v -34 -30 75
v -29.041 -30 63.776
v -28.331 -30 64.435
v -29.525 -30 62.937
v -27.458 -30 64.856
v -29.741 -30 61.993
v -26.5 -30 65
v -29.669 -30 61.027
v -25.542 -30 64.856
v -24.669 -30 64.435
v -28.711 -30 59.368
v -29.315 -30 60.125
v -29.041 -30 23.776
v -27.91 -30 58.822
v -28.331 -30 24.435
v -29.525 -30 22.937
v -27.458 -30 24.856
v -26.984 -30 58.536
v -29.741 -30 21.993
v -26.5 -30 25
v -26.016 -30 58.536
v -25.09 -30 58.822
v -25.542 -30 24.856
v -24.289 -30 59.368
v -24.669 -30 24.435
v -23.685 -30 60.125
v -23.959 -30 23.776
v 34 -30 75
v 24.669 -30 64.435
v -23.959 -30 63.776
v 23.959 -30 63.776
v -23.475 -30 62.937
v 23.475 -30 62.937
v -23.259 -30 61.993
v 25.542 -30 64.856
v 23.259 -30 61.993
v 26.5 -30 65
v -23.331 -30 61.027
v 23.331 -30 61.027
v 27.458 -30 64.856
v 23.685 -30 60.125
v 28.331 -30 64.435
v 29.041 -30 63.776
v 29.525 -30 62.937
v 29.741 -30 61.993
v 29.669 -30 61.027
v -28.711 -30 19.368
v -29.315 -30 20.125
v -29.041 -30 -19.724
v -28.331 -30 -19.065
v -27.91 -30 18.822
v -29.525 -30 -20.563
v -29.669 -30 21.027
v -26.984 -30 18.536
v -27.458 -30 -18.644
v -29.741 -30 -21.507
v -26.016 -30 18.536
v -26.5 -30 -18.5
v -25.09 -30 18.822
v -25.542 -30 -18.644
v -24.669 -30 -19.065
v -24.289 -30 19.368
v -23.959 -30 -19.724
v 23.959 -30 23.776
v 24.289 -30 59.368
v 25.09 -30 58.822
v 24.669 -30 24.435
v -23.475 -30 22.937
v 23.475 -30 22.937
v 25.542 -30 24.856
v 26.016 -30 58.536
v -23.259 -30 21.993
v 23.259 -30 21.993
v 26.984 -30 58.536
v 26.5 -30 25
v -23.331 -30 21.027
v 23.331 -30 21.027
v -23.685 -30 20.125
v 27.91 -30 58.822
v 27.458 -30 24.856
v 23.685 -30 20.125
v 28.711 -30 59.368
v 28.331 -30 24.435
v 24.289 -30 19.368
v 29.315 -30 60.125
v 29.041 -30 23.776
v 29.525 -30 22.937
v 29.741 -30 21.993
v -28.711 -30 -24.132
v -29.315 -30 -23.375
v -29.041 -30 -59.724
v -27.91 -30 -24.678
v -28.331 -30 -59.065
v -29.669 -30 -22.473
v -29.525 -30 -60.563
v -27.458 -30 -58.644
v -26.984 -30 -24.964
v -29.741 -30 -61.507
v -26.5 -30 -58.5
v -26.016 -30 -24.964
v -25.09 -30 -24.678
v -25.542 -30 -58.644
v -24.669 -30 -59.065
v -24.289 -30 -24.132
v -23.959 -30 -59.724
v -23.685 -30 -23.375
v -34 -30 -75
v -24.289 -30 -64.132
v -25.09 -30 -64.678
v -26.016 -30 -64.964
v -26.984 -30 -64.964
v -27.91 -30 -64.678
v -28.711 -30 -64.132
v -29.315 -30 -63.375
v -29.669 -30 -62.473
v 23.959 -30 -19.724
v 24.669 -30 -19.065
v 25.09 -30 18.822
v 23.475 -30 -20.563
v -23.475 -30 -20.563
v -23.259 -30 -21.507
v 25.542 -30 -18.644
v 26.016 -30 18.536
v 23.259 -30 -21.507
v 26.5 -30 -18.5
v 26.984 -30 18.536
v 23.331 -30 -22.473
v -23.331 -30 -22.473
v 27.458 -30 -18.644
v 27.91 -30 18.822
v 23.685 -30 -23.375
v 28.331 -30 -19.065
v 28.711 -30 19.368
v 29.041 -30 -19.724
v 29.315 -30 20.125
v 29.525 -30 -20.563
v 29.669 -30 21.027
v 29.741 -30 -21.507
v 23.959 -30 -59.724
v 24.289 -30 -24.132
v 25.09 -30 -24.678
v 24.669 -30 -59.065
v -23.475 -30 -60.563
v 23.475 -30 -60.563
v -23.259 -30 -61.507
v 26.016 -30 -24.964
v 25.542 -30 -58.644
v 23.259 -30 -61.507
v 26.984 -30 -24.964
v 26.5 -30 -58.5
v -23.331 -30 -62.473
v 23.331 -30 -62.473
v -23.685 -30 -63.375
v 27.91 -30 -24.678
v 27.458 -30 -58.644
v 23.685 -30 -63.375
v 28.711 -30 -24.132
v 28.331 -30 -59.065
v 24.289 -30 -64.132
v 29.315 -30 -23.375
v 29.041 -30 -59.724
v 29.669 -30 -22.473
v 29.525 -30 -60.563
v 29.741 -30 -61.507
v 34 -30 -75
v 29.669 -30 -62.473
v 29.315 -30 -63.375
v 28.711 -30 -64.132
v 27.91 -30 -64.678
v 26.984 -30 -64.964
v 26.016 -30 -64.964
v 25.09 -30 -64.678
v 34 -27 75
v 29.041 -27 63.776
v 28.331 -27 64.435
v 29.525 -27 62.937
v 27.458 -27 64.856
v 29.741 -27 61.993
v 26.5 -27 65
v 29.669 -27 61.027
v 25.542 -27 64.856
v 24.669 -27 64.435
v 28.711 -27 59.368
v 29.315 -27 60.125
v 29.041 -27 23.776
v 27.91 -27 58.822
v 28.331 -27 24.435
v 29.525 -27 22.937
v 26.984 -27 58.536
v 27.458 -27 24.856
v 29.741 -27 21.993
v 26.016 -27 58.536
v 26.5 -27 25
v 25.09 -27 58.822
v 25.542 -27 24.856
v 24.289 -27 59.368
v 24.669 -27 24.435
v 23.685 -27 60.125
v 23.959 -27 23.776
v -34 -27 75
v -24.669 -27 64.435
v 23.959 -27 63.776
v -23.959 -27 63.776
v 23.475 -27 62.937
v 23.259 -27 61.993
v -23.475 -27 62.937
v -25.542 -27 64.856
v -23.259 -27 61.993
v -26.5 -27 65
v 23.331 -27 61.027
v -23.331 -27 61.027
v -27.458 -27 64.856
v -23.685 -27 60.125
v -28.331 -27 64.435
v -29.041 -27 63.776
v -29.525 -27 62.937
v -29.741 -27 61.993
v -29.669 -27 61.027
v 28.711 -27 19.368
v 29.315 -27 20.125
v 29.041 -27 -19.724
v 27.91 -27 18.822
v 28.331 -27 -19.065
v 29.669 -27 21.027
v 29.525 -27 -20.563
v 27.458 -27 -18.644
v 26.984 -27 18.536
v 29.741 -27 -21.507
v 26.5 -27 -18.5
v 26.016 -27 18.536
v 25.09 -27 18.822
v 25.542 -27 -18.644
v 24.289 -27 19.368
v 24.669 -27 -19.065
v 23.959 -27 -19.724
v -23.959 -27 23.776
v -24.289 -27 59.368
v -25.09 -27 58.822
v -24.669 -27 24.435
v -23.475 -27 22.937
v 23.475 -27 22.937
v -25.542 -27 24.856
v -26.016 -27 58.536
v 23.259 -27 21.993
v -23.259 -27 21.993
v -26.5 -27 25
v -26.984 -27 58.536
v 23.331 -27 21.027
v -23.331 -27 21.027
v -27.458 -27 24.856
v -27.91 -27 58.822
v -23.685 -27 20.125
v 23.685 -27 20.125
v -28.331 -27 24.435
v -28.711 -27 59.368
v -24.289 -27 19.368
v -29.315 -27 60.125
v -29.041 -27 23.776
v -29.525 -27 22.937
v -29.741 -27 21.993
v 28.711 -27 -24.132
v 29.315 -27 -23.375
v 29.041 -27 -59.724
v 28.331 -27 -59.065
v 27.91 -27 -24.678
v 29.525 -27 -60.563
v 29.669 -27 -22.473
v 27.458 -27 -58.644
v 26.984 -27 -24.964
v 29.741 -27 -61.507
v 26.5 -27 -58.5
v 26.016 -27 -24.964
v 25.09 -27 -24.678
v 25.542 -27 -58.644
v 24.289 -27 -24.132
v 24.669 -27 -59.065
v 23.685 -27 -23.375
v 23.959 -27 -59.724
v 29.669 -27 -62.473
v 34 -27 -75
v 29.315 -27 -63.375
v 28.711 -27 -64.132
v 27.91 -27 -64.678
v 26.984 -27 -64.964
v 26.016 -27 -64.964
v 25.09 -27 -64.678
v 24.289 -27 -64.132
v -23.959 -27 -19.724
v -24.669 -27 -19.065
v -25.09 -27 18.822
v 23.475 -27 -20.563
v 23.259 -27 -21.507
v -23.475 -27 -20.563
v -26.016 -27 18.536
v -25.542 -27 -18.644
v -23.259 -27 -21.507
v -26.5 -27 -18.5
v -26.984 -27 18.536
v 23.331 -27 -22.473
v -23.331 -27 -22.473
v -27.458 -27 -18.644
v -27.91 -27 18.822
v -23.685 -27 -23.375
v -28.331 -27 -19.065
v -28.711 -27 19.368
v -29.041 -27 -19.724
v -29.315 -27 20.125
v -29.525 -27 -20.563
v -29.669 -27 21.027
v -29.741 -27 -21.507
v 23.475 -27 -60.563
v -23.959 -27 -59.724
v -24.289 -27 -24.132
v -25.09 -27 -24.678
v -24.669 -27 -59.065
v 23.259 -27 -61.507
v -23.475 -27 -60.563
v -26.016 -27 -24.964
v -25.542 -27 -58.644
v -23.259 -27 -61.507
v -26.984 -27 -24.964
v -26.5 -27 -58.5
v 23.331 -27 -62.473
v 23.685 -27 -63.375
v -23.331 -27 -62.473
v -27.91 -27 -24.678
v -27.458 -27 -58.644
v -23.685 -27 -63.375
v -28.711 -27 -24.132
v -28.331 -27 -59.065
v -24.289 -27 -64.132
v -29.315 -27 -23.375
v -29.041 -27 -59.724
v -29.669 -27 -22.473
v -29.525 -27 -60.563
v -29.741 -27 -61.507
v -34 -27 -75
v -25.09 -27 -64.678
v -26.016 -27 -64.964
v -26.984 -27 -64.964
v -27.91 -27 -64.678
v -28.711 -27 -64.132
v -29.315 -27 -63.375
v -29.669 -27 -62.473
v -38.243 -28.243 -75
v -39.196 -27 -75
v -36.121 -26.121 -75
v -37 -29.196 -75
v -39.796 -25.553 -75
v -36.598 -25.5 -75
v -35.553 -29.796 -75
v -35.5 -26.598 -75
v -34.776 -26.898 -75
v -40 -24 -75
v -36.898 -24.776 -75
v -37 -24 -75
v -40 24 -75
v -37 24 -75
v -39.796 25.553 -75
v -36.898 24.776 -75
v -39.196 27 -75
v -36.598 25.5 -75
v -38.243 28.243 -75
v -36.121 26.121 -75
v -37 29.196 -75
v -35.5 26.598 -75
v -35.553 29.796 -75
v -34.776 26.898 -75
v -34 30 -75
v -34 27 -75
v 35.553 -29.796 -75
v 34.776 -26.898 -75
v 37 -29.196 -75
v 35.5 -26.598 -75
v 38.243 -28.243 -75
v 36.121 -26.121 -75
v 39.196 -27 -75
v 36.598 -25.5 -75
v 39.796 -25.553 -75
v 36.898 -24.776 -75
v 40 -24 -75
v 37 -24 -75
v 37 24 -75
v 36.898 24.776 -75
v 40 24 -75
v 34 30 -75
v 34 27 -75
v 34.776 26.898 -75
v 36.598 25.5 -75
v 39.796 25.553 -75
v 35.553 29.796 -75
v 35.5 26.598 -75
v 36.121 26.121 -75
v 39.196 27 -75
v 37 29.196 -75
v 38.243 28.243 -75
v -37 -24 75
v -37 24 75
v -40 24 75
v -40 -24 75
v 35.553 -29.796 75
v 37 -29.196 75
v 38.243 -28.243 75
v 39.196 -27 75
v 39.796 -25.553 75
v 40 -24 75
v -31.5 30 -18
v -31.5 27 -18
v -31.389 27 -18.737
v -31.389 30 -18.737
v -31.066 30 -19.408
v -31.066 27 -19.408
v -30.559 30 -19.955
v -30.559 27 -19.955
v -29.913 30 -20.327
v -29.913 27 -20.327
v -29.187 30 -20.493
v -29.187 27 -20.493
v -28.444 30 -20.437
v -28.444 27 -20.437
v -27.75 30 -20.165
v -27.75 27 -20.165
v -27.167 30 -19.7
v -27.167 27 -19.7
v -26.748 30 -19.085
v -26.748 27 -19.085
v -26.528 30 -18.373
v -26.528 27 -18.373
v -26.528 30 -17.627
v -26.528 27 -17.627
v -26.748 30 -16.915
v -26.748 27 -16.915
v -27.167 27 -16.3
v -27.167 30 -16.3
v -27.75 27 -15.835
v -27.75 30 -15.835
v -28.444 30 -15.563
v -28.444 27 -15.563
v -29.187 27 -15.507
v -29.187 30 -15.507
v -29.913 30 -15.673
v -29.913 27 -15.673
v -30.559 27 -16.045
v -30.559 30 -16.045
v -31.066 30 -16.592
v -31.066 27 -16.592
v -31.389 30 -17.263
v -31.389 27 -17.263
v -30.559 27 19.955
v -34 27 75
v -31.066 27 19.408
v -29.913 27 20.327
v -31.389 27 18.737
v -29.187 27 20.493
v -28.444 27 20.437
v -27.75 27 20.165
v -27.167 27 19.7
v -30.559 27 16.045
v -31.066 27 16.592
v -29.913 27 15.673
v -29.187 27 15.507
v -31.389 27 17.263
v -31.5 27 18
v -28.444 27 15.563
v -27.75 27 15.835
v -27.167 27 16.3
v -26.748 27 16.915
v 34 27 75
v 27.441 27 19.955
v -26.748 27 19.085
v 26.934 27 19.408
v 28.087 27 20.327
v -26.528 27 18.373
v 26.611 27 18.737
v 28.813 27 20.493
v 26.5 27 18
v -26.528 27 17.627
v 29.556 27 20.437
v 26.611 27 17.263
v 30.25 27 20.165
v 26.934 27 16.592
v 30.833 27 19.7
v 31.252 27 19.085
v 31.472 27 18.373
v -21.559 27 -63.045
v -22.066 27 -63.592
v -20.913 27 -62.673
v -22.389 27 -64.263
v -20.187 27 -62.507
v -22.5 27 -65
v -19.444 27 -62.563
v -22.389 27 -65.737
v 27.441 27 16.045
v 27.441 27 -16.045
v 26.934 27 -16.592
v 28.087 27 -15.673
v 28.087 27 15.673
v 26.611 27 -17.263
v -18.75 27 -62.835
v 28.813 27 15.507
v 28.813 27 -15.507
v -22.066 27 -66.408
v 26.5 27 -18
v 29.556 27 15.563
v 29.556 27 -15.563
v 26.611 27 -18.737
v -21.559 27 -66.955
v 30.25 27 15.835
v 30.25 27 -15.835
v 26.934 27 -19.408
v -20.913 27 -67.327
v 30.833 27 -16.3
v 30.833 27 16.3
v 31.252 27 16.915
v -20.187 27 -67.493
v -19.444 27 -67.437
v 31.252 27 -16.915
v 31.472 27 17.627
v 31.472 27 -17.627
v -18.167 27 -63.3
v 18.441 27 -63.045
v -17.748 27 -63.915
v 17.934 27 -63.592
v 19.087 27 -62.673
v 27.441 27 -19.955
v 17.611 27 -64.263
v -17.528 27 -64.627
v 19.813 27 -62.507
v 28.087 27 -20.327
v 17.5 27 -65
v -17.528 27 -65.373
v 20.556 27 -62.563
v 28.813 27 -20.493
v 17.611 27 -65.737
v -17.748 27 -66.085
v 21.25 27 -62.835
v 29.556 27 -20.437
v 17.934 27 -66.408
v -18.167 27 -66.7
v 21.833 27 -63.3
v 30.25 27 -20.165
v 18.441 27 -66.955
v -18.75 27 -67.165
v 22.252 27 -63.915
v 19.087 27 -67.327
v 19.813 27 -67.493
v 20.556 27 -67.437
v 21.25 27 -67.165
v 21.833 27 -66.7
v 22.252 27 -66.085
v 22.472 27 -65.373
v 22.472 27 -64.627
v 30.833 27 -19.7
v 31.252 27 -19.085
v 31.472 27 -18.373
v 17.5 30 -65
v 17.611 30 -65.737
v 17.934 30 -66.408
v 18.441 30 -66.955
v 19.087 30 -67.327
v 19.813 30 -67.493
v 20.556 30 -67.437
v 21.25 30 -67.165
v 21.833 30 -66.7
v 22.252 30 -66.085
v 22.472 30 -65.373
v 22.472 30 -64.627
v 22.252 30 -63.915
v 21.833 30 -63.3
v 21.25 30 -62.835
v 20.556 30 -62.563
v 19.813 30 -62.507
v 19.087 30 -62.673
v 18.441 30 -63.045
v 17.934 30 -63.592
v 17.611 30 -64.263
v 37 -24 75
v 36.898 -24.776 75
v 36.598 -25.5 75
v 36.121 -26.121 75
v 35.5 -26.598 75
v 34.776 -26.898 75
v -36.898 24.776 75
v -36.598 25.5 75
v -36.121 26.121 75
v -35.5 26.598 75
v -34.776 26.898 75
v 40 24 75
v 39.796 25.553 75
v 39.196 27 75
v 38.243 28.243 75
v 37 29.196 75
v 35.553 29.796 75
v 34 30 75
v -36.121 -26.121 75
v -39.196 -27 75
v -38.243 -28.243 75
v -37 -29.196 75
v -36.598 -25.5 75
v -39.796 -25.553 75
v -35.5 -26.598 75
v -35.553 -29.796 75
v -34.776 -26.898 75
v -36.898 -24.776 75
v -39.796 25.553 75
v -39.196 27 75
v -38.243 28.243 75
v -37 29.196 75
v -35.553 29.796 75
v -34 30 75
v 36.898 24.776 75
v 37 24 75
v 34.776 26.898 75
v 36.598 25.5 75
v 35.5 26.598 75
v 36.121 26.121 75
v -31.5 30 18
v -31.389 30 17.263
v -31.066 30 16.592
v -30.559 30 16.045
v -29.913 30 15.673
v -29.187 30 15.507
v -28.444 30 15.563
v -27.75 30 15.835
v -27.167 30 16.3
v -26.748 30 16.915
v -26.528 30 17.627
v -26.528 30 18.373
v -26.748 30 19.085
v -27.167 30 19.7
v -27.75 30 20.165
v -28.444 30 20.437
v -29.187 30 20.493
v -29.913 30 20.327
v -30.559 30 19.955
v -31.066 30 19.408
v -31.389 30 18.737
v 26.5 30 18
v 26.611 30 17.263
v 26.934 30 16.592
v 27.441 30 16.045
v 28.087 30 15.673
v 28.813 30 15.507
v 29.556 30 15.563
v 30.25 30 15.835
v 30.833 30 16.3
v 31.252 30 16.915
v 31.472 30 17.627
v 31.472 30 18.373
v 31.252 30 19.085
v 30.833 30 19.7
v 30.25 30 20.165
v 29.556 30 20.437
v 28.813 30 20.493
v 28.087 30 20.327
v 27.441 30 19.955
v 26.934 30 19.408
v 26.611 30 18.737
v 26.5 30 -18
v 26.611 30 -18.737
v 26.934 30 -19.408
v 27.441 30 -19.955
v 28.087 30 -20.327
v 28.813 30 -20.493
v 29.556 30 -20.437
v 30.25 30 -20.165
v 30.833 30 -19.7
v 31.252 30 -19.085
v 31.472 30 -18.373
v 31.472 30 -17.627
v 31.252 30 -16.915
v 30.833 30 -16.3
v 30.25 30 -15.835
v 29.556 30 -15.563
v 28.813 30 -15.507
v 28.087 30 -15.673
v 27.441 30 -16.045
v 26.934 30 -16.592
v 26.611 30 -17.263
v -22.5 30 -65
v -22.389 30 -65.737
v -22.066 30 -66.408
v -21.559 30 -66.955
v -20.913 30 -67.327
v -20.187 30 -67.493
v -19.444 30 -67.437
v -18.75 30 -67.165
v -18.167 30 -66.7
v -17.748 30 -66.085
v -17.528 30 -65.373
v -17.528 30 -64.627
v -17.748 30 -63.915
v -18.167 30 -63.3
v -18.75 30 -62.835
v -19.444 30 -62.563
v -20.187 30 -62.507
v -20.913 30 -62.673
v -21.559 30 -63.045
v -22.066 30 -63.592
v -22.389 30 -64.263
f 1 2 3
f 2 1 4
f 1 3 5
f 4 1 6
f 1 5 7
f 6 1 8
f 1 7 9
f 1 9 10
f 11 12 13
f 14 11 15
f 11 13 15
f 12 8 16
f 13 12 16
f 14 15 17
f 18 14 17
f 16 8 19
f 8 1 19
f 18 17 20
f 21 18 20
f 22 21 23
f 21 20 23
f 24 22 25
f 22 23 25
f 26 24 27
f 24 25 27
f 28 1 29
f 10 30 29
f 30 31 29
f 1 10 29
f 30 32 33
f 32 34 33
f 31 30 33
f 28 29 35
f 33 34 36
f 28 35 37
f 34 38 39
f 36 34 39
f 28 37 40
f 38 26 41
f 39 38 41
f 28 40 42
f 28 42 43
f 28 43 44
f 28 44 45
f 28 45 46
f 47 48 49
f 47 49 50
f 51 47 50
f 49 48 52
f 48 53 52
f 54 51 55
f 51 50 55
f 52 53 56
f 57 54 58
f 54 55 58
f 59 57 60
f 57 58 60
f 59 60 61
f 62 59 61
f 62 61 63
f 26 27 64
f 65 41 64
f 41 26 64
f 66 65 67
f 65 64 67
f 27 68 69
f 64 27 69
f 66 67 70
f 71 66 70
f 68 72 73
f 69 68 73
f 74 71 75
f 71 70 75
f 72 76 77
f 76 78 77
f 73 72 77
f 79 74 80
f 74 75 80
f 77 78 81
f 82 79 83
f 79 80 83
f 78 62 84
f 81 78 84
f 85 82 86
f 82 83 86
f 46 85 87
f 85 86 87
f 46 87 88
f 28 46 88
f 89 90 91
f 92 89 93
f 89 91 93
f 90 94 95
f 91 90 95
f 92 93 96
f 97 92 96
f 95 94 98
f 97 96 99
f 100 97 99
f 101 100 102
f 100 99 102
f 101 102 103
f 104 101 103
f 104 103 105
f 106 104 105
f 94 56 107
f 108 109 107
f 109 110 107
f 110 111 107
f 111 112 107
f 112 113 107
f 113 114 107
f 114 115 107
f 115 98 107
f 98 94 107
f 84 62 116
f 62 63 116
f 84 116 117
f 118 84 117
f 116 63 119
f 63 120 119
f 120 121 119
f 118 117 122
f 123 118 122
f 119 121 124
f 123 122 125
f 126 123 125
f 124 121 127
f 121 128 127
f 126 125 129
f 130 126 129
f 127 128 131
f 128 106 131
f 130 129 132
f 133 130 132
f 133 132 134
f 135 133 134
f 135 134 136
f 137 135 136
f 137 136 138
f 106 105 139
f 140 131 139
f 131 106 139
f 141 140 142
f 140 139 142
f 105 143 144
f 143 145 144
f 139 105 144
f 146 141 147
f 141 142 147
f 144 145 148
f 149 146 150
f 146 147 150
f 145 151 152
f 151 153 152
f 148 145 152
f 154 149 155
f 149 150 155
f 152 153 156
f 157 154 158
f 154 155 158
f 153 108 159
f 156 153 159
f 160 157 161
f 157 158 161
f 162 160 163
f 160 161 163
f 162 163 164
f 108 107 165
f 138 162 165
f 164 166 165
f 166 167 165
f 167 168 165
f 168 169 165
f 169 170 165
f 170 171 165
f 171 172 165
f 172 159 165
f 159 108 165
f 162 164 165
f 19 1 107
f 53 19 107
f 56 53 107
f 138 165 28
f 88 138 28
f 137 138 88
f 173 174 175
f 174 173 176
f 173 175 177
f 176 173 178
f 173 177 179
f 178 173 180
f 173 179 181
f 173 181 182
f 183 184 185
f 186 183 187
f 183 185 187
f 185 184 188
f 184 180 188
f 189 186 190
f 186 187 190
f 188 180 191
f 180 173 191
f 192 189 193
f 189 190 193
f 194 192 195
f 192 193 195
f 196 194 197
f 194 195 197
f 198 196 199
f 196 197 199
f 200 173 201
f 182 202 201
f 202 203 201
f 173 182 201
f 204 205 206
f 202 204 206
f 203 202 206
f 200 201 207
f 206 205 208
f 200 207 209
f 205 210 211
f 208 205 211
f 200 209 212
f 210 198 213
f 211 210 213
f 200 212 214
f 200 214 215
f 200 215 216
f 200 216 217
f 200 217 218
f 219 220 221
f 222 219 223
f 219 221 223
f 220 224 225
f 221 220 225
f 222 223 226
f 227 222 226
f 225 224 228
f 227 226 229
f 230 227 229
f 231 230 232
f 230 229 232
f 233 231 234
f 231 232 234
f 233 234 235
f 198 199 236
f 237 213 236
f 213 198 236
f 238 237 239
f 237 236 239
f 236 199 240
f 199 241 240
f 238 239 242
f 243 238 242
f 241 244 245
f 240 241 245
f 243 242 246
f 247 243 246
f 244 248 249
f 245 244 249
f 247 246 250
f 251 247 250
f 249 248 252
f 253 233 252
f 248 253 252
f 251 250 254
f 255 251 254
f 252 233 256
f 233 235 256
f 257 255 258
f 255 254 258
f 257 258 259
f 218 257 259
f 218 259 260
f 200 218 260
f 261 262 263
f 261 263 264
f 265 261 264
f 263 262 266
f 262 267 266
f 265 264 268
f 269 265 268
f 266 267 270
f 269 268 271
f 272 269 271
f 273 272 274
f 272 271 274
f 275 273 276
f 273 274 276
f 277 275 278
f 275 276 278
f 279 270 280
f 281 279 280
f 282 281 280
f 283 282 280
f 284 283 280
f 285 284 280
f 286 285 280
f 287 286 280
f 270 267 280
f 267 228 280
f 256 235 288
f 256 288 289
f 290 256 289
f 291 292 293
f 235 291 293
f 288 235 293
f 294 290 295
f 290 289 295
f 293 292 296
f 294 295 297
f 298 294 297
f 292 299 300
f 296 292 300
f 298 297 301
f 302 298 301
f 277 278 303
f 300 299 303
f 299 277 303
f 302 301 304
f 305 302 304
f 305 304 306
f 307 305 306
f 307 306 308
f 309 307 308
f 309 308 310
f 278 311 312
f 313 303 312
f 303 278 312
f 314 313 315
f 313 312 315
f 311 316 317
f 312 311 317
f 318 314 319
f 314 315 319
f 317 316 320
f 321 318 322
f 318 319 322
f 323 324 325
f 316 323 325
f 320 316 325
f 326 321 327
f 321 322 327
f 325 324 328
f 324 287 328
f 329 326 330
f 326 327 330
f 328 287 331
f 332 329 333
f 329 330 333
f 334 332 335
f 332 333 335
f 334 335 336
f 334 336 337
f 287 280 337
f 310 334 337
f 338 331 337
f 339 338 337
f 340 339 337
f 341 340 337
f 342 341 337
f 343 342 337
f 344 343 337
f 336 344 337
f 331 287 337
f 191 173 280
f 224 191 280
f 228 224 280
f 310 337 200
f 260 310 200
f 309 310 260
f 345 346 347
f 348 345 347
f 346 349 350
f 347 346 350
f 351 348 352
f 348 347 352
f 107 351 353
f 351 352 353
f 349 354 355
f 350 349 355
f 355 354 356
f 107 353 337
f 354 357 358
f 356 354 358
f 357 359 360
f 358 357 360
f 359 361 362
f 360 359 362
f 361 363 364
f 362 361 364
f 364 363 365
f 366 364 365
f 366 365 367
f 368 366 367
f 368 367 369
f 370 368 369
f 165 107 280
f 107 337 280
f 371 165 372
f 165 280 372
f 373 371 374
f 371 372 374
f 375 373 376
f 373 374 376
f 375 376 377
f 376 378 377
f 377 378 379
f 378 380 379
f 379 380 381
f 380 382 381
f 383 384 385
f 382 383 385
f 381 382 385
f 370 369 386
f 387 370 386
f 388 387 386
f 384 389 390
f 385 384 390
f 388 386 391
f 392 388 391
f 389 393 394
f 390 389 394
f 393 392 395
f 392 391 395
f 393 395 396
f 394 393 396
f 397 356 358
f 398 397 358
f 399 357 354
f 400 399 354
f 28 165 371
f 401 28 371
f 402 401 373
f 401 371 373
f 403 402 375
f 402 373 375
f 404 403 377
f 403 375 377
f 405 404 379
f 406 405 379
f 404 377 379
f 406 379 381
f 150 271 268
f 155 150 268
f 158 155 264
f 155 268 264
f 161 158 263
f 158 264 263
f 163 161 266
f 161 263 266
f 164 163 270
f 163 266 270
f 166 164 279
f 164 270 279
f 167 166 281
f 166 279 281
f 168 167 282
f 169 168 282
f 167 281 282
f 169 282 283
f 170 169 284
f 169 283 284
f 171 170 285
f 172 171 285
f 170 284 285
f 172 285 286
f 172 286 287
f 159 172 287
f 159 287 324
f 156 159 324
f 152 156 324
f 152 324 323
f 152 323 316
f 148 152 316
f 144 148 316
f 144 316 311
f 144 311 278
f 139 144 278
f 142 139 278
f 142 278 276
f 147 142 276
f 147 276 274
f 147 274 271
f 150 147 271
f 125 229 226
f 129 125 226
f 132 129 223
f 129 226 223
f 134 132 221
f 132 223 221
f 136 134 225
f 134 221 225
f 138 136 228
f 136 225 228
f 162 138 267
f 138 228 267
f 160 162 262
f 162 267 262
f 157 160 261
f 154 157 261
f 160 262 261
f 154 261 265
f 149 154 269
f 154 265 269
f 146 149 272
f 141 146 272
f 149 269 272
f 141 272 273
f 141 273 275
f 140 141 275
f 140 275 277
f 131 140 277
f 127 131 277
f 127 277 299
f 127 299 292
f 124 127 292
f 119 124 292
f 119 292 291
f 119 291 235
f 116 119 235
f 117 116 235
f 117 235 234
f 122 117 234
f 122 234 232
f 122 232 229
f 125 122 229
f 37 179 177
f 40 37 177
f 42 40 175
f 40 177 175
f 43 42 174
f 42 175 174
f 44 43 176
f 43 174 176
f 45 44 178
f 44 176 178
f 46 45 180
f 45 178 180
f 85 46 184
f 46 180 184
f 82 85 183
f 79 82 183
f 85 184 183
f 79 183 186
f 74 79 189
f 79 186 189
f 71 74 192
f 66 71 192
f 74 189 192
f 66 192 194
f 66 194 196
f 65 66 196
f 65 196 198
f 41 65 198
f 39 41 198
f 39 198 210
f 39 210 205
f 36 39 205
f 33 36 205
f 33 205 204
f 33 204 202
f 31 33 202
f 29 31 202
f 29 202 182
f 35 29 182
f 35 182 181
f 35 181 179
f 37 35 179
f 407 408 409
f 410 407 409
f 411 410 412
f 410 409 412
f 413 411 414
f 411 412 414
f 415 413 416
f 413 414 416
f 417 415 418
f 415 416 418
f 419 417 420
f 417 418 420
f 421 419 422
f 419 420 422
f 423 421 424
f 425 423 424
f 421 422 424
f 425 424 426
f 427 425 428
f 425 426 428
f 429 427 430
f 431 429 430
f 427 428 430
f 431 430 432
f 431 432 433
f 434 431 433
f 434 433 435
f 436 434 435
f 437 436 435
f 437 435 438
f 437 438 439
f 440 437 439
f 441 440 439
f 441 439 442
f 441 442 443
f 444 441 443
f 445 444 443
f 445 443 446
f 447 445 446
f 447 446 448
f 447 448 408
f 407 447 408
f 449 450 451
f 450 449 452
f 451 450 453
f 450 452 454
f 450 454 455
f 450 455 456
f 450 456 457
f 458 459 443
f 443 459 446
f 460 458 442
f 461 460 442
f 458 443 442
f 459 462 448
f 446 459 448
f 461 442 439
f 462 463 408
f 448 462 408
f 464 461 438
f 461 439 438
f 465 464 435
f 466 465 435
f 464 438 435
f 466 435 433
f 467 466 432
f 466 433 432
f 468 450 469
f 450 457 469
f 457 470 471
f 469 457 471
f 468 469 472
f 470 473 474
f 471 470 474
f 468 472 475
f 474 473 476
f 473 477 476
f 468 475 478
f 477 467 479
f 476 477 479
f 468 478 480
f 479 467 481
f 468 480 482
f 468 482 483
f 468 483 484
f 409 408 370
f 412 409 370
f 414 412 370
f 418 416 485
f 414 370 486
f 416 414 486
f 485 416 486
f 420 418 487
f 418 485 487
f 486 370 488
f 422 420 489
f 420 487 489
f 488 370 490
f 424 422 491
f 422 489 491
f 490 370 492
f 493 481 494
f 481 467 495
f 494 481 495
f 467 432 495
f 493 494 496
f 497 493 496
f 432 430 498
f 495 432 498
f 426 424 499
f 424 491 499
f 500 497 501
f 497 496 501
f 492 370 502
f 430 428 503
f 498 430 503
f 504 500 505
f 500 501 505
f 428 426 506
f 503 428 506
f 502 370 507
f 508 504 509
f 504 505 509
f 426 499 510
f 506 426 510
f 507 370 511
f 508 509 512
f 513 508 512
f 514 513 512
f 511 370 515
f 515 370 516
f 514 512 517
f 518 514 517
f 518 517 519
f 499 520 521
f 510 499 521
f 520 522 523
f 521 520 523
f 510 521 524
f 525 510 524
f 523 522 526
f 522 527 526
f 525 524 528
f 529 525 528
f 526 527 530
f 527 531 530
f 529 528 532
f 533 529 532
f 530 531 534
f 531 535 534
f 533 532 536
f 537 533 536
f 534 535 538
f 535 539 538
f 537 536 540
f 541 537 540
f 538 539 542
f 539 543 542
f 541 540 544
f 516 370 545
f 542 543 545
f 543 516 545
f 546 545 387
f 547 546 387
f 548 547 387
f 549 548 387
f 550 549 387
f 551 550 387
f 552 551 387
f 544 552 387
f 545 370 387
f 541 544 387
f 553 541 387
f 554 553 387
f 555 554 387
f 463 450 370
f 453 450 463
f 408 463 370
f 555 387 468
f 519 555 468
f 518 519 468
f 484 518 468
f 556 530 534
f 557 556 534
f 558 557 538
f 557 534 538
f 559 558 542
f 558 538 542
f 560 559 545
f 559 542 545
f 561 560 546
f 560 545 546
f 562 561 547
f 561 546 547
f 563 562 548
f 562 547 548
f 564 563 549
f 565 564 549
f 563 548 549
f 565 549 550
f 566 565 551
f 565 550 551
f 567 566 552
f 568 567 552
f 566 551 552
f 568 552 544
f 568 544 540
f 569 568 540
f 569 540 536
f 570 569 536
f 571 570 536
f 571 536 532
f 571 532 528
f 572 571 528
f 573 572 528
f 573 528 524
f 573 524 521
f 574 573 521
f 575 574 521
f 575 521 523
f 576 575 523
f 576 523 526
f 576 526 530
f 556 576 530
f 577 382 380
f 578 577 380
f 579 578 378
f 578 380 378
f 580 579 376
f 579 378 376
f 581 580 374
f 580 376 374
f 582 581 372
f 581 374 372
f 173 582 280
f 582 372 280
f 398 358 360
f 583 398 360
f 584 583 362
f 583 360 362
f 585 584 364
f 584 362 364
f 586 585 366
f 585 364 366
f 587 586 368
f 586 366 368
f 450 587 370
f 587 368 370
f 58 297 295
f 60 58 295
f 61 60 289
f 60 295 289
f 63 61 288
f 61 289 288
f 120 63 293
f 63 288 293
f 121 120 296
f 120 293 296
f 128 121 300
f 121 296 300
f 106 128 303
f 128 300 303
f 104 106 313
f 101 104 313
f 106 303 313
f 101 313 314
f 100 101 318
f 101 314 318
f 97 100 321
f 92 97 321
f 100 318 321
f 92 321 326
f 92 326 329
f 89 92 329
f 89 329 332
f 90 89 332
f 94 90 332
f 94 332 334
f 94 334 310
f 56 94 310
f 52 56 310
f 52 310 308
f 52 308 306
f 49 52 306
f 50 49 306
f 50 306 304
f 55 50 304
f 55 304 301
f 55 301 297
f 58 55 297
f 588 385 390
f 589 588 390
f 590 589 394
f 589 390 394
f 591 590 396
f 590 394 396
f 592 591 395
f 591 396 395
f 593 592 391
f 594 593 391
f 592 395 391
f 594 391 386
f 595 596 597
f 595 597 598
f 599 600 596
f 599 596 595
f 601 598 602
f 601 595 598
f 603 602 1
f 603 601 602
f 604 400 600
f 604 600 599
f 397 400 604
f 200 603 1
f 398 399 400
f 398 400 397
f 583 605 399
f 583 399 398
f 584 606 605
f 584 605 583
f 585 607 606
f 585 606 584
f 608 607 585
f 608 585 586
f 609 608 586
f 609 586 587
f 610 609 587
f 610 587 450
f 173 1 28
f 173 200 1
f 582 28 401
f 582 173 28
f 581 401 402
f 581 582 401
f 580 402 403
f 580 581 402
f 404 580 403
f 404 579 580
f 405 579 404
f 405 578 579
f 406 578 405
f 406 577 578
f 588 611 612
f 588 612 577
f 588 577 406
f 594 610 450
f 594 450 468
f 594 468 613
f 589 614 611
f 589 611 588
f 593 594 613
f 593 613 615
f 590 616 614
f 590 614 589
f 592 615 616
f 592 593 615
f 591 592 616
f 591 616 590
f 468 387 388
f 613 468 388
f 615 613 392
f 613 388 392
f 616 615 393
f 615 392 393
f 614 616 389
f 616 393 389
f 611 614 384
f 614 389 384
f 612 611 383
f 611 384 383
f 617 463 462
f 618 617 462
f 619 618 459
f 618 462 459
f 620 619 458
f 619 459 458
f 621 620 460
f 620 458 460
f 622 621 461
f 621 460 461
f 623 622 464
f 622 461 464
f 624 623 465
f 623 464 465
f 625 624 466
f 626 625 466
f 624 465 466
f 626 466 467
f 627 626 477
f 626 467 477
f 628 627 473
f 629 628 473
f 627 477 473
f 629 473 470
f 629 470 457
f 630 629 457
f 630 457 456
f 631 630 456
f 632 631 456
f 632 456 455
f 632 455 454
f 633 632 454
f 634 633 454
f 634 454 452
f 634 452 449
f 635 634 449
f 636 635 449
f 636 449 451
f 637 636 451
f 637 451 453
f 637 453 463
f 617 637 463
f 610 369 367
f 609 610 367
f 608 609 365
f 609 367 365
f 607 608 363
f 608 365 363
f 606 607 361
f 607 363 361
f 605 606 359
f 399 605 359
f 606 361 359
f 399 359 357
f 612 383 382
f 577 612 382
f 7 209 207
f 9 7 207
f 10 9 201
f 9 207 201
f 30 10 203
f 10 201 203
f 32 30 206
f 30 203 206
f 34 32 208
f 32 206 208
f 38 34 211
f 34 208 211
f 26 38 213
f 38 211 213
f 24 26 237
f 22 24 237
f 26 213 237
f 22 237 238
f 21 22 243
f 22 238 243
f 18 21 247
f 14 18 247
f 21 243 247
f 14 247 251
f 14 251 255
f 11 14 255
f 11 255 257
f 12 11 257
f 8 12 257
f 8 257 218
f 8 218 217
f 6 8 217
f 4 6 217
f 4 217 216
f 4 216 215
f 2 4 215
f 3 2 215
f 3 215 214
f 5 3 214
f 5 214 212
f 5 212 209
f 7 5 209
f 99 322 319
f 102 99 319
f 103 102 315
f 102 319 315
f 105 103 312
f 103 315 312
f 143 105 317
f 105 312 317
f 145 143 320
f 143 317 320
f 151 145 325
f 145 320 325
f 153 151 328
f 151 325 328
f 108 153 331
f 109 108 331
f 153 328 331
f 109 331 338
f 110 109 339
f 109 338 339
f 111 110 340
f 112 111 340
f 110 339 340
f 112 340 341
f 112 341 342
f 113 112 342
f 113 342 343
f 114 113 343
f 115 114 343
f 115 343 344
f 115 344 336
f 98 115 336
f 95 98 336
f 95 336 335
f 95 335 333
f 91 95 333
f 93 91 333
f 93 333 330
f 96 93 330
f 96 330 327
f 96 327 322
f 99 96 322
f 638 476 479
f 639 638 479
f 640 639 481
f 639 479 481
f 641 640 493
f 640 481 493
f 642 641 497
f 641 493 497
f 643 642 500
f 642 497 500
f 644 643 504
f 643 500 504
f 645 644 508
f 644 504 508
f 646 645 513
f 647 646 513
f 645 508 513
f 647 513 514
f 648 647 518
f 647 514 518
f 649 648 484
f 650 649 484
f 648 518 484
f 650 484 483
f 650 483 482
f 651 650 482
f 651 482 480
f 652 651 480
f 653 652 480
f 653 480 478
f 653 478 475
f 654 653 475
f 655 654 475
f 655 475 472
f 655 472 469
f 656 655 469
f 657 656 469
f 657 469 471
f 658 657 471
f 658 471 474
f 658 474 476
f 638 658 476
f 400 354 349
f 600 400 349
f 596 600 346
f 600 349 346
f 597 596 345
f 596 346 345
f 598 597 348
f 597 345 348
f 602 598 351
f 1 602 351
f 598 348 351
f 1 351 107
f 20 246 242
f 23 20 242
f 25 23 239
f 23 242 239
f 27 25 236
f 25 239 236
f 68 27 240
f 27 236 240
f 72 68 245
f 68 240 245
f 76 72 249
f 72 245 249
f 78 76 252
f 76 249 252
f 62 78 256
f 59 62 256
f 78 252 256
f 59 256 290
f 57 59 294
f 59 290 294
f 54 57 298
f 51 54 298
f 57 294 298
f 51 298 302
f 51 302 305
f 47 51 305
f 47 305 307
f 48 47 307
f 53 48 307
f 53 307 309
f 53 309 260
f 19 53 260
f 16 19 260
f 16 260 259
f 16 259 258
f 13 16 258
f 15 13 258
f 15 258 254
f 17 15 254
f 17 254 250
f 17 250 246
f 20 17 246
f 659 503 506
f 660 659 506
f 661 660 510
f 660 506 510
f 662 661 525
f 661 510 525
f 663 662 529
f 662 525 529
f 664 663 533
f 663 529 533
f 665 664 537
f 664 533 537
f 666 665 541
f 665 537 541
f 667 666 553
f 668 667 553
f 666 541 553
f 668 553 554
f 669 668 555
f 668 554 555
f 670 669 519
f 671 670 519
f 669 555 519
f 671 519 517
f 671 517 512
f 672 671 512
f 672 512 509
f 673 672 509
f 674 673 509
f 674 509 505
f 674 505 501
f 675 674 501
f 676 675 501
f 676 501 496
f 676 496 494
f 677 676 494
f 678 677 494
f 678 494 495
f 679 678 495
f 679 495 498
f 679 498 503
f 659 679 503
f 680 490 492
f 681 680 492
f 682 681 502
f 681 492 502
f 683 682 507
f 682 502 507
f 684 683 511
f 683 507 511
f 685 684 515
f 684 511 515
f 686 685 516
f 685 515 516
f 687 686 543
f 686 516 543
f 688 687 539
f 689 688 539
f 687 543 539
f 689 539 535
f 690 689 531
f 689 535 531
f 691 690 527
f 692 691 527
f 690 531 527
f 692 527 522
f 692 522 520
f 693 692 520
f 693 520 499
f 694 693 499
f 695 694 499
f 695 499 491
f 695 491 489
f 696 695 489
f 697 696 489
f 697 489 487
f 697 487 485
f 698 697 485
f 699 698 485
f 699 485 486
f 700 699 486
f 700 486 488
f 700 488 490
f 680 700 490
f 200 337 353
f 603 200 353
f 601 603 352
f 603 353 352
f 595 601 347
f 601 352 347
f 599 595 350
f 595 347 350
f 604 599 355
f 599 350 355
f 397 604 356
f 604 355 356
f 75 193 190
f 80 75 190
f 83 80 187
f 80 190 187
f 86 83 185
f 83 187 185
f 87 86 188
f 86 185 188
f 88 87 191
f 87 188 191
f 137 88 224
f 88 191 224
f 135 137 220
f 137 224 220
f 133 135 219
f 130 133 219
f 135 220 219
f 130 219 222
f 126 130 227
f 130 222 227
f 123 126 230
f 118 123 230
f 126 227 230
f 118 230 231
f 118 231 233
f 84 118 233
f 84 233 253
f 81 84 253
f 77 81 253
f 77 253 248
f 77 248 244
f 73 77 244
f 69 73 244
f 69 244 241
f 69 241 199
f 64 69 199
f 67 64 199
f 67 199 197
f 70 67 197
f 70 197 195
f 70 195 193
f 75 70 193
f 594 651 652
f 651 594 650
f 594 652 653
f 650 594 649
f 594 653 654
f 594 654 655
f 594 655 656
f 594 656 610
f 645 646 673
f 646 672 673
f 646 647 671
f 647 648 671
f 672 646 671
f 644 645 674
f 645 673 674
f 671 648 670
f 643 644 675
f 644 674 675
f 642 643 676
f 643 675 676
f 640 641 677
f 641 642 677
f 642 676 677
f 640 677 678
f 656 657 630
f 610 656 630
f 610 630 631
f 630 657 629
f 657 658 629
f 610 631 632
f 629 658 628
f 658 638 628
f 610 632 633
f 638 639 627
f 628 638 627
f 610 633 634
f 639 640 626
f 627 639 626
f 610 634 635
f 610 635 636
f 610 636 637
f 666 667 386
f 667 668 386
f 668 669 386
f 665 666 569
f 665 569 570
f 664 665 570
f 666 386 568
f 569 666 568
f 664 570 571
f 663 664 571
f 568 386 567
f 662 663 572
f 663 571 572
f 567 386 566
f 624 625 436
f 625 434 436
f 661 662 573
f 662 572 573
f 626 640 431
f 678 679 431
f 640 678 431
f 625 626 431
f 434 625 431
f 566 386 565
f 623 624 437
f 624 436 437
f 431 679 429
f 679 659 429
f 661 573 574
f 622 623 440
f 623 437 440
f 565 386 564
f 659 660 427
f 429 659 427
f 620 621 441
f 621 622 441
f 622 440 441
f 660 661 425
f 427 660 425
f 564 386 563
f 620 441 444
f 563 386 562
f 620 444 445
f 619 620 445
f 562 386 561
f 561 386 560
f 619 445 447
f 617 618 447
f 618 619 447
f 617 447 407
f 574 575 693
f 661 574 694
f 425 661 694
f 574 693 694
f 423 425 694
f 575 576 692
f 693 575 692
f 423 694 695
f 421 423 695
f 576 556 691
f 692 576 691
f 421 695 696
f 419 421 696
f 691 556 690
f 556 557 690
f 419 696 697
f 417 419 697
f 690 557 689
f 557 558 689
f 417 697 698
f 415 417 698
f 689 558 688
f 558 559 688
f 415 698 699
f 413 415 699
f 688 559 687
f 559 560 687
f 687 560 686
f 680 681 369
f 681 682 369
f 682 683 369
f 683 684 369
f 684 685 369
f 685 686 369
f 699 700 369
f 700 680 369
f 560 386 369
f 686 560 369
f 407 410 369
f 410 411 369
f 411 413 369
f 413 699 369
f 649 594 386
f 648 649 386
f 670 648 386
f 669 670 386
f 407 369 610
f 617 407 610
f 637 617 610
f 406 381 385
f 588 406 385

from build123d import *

# Parameters (mm, degrees)
BOSS_EXTRUDE1_DEPTH             = 75
BOSS_EXTRUDE1_DEPTH_BACK        = 75
F_6_5_6_5_DIAMETER_HOLE1_D      = 6.5
F_6_5_6_5_DIAMETER_HOLE1_DEPTH  = 3
TAP_DRILL_FOR_M6X1_0_TAP1_D     = 5
TAP_DRILL_FOR_M6X1_0_TAP1_DEPTH = 3


with BuildPart() as part:
    # Sketch1 → Boss-Extrude1 (new, two sides: drawn at the far end of the back side and taken through both)
    with BuildSketch(Plane.XY.offset(-BOSS_EXTRUDE1_DEPTH_BACK)):
        with BuildLine():
            Line((-34, -30), (34, -30))
            ThreePointArc((34, -30), (38.242640687, -28.242640687), (40, -24))
            Line((40, -24), (40, 24))
            ThreePointArc((40, 24), (38.242640687, 28.242640687), (34, 30))
            Line((34, 30), (-34, 30))
            ThreePointArc((-34, 30), (-38.242640687, 28.242640687), (-40, 24))
            Line((-40, 24), (-40, -24))
            ThreePointArc((-40, -24), (-38.242640687, -28.242640687), (-34, -30))
        make_face()
        with BuildLine():
            Line((-34, 27), (34, 27))
            ThreePointArc((34, 27), (36.121320344, 26.121320344), (37, 24))
            Line((37, 24), (37, -24))
            ThreePointArc((37, -24), (36.121320344, -26.121320344), (34, -27))
            Line((34, -27), (-34, -27))
            ThreePointArc((-34, -27), (-36.121320344, -26.121320344), (-37, -24))
            Line((-37, -24), (-37, 24))
            ThreePointArc((-37, 24), (-36.121320344, 26.121320344), (-34, 27))
        make_face(mode=Mode.SUBTRACT)
    extrude(amount=BOSS_EXTRUDE1_DEPTH + BOSS_EXTRUDE1_DEPTH_BACK)

    # Ø6.5 (6.5) Diameter Hole1
    with Locations(Plane(origin=(-26.5, -30, 61.75), x_dir=(0, 0, -1), z_dir=(0, -1, 0))):
        with Locations((0, 0), (0, 53), (40, 53), (40, 0), (83.5, 0), (83.5, 53), (123.5, 53), (123.5, 0)):
            Hole(F_6_5_6_5_DIAMETER_HOLE1_D / 2, depth=F_6_5_6_5_DIAMETER_HOLE1_DEPTH)

    # Tap Drill for M6x1.0 Tap1
    with Locations(Plane(origin=(29.000000001, 30, -18), x_dir=(1, 0, 0), z_dir=(0, 1, 0))):
        with Locations((0, 0), (0, -36), (-58, -36), (-58, 0), (-49, 47), (-9, 47)):
            Hole(TAP_DRILL_FOR_M6X1_0_TAP1_D / 2, depth=TAP_DRILL_FOR_M6X1_0_TAP1_DEPTH)


solid = part.part
